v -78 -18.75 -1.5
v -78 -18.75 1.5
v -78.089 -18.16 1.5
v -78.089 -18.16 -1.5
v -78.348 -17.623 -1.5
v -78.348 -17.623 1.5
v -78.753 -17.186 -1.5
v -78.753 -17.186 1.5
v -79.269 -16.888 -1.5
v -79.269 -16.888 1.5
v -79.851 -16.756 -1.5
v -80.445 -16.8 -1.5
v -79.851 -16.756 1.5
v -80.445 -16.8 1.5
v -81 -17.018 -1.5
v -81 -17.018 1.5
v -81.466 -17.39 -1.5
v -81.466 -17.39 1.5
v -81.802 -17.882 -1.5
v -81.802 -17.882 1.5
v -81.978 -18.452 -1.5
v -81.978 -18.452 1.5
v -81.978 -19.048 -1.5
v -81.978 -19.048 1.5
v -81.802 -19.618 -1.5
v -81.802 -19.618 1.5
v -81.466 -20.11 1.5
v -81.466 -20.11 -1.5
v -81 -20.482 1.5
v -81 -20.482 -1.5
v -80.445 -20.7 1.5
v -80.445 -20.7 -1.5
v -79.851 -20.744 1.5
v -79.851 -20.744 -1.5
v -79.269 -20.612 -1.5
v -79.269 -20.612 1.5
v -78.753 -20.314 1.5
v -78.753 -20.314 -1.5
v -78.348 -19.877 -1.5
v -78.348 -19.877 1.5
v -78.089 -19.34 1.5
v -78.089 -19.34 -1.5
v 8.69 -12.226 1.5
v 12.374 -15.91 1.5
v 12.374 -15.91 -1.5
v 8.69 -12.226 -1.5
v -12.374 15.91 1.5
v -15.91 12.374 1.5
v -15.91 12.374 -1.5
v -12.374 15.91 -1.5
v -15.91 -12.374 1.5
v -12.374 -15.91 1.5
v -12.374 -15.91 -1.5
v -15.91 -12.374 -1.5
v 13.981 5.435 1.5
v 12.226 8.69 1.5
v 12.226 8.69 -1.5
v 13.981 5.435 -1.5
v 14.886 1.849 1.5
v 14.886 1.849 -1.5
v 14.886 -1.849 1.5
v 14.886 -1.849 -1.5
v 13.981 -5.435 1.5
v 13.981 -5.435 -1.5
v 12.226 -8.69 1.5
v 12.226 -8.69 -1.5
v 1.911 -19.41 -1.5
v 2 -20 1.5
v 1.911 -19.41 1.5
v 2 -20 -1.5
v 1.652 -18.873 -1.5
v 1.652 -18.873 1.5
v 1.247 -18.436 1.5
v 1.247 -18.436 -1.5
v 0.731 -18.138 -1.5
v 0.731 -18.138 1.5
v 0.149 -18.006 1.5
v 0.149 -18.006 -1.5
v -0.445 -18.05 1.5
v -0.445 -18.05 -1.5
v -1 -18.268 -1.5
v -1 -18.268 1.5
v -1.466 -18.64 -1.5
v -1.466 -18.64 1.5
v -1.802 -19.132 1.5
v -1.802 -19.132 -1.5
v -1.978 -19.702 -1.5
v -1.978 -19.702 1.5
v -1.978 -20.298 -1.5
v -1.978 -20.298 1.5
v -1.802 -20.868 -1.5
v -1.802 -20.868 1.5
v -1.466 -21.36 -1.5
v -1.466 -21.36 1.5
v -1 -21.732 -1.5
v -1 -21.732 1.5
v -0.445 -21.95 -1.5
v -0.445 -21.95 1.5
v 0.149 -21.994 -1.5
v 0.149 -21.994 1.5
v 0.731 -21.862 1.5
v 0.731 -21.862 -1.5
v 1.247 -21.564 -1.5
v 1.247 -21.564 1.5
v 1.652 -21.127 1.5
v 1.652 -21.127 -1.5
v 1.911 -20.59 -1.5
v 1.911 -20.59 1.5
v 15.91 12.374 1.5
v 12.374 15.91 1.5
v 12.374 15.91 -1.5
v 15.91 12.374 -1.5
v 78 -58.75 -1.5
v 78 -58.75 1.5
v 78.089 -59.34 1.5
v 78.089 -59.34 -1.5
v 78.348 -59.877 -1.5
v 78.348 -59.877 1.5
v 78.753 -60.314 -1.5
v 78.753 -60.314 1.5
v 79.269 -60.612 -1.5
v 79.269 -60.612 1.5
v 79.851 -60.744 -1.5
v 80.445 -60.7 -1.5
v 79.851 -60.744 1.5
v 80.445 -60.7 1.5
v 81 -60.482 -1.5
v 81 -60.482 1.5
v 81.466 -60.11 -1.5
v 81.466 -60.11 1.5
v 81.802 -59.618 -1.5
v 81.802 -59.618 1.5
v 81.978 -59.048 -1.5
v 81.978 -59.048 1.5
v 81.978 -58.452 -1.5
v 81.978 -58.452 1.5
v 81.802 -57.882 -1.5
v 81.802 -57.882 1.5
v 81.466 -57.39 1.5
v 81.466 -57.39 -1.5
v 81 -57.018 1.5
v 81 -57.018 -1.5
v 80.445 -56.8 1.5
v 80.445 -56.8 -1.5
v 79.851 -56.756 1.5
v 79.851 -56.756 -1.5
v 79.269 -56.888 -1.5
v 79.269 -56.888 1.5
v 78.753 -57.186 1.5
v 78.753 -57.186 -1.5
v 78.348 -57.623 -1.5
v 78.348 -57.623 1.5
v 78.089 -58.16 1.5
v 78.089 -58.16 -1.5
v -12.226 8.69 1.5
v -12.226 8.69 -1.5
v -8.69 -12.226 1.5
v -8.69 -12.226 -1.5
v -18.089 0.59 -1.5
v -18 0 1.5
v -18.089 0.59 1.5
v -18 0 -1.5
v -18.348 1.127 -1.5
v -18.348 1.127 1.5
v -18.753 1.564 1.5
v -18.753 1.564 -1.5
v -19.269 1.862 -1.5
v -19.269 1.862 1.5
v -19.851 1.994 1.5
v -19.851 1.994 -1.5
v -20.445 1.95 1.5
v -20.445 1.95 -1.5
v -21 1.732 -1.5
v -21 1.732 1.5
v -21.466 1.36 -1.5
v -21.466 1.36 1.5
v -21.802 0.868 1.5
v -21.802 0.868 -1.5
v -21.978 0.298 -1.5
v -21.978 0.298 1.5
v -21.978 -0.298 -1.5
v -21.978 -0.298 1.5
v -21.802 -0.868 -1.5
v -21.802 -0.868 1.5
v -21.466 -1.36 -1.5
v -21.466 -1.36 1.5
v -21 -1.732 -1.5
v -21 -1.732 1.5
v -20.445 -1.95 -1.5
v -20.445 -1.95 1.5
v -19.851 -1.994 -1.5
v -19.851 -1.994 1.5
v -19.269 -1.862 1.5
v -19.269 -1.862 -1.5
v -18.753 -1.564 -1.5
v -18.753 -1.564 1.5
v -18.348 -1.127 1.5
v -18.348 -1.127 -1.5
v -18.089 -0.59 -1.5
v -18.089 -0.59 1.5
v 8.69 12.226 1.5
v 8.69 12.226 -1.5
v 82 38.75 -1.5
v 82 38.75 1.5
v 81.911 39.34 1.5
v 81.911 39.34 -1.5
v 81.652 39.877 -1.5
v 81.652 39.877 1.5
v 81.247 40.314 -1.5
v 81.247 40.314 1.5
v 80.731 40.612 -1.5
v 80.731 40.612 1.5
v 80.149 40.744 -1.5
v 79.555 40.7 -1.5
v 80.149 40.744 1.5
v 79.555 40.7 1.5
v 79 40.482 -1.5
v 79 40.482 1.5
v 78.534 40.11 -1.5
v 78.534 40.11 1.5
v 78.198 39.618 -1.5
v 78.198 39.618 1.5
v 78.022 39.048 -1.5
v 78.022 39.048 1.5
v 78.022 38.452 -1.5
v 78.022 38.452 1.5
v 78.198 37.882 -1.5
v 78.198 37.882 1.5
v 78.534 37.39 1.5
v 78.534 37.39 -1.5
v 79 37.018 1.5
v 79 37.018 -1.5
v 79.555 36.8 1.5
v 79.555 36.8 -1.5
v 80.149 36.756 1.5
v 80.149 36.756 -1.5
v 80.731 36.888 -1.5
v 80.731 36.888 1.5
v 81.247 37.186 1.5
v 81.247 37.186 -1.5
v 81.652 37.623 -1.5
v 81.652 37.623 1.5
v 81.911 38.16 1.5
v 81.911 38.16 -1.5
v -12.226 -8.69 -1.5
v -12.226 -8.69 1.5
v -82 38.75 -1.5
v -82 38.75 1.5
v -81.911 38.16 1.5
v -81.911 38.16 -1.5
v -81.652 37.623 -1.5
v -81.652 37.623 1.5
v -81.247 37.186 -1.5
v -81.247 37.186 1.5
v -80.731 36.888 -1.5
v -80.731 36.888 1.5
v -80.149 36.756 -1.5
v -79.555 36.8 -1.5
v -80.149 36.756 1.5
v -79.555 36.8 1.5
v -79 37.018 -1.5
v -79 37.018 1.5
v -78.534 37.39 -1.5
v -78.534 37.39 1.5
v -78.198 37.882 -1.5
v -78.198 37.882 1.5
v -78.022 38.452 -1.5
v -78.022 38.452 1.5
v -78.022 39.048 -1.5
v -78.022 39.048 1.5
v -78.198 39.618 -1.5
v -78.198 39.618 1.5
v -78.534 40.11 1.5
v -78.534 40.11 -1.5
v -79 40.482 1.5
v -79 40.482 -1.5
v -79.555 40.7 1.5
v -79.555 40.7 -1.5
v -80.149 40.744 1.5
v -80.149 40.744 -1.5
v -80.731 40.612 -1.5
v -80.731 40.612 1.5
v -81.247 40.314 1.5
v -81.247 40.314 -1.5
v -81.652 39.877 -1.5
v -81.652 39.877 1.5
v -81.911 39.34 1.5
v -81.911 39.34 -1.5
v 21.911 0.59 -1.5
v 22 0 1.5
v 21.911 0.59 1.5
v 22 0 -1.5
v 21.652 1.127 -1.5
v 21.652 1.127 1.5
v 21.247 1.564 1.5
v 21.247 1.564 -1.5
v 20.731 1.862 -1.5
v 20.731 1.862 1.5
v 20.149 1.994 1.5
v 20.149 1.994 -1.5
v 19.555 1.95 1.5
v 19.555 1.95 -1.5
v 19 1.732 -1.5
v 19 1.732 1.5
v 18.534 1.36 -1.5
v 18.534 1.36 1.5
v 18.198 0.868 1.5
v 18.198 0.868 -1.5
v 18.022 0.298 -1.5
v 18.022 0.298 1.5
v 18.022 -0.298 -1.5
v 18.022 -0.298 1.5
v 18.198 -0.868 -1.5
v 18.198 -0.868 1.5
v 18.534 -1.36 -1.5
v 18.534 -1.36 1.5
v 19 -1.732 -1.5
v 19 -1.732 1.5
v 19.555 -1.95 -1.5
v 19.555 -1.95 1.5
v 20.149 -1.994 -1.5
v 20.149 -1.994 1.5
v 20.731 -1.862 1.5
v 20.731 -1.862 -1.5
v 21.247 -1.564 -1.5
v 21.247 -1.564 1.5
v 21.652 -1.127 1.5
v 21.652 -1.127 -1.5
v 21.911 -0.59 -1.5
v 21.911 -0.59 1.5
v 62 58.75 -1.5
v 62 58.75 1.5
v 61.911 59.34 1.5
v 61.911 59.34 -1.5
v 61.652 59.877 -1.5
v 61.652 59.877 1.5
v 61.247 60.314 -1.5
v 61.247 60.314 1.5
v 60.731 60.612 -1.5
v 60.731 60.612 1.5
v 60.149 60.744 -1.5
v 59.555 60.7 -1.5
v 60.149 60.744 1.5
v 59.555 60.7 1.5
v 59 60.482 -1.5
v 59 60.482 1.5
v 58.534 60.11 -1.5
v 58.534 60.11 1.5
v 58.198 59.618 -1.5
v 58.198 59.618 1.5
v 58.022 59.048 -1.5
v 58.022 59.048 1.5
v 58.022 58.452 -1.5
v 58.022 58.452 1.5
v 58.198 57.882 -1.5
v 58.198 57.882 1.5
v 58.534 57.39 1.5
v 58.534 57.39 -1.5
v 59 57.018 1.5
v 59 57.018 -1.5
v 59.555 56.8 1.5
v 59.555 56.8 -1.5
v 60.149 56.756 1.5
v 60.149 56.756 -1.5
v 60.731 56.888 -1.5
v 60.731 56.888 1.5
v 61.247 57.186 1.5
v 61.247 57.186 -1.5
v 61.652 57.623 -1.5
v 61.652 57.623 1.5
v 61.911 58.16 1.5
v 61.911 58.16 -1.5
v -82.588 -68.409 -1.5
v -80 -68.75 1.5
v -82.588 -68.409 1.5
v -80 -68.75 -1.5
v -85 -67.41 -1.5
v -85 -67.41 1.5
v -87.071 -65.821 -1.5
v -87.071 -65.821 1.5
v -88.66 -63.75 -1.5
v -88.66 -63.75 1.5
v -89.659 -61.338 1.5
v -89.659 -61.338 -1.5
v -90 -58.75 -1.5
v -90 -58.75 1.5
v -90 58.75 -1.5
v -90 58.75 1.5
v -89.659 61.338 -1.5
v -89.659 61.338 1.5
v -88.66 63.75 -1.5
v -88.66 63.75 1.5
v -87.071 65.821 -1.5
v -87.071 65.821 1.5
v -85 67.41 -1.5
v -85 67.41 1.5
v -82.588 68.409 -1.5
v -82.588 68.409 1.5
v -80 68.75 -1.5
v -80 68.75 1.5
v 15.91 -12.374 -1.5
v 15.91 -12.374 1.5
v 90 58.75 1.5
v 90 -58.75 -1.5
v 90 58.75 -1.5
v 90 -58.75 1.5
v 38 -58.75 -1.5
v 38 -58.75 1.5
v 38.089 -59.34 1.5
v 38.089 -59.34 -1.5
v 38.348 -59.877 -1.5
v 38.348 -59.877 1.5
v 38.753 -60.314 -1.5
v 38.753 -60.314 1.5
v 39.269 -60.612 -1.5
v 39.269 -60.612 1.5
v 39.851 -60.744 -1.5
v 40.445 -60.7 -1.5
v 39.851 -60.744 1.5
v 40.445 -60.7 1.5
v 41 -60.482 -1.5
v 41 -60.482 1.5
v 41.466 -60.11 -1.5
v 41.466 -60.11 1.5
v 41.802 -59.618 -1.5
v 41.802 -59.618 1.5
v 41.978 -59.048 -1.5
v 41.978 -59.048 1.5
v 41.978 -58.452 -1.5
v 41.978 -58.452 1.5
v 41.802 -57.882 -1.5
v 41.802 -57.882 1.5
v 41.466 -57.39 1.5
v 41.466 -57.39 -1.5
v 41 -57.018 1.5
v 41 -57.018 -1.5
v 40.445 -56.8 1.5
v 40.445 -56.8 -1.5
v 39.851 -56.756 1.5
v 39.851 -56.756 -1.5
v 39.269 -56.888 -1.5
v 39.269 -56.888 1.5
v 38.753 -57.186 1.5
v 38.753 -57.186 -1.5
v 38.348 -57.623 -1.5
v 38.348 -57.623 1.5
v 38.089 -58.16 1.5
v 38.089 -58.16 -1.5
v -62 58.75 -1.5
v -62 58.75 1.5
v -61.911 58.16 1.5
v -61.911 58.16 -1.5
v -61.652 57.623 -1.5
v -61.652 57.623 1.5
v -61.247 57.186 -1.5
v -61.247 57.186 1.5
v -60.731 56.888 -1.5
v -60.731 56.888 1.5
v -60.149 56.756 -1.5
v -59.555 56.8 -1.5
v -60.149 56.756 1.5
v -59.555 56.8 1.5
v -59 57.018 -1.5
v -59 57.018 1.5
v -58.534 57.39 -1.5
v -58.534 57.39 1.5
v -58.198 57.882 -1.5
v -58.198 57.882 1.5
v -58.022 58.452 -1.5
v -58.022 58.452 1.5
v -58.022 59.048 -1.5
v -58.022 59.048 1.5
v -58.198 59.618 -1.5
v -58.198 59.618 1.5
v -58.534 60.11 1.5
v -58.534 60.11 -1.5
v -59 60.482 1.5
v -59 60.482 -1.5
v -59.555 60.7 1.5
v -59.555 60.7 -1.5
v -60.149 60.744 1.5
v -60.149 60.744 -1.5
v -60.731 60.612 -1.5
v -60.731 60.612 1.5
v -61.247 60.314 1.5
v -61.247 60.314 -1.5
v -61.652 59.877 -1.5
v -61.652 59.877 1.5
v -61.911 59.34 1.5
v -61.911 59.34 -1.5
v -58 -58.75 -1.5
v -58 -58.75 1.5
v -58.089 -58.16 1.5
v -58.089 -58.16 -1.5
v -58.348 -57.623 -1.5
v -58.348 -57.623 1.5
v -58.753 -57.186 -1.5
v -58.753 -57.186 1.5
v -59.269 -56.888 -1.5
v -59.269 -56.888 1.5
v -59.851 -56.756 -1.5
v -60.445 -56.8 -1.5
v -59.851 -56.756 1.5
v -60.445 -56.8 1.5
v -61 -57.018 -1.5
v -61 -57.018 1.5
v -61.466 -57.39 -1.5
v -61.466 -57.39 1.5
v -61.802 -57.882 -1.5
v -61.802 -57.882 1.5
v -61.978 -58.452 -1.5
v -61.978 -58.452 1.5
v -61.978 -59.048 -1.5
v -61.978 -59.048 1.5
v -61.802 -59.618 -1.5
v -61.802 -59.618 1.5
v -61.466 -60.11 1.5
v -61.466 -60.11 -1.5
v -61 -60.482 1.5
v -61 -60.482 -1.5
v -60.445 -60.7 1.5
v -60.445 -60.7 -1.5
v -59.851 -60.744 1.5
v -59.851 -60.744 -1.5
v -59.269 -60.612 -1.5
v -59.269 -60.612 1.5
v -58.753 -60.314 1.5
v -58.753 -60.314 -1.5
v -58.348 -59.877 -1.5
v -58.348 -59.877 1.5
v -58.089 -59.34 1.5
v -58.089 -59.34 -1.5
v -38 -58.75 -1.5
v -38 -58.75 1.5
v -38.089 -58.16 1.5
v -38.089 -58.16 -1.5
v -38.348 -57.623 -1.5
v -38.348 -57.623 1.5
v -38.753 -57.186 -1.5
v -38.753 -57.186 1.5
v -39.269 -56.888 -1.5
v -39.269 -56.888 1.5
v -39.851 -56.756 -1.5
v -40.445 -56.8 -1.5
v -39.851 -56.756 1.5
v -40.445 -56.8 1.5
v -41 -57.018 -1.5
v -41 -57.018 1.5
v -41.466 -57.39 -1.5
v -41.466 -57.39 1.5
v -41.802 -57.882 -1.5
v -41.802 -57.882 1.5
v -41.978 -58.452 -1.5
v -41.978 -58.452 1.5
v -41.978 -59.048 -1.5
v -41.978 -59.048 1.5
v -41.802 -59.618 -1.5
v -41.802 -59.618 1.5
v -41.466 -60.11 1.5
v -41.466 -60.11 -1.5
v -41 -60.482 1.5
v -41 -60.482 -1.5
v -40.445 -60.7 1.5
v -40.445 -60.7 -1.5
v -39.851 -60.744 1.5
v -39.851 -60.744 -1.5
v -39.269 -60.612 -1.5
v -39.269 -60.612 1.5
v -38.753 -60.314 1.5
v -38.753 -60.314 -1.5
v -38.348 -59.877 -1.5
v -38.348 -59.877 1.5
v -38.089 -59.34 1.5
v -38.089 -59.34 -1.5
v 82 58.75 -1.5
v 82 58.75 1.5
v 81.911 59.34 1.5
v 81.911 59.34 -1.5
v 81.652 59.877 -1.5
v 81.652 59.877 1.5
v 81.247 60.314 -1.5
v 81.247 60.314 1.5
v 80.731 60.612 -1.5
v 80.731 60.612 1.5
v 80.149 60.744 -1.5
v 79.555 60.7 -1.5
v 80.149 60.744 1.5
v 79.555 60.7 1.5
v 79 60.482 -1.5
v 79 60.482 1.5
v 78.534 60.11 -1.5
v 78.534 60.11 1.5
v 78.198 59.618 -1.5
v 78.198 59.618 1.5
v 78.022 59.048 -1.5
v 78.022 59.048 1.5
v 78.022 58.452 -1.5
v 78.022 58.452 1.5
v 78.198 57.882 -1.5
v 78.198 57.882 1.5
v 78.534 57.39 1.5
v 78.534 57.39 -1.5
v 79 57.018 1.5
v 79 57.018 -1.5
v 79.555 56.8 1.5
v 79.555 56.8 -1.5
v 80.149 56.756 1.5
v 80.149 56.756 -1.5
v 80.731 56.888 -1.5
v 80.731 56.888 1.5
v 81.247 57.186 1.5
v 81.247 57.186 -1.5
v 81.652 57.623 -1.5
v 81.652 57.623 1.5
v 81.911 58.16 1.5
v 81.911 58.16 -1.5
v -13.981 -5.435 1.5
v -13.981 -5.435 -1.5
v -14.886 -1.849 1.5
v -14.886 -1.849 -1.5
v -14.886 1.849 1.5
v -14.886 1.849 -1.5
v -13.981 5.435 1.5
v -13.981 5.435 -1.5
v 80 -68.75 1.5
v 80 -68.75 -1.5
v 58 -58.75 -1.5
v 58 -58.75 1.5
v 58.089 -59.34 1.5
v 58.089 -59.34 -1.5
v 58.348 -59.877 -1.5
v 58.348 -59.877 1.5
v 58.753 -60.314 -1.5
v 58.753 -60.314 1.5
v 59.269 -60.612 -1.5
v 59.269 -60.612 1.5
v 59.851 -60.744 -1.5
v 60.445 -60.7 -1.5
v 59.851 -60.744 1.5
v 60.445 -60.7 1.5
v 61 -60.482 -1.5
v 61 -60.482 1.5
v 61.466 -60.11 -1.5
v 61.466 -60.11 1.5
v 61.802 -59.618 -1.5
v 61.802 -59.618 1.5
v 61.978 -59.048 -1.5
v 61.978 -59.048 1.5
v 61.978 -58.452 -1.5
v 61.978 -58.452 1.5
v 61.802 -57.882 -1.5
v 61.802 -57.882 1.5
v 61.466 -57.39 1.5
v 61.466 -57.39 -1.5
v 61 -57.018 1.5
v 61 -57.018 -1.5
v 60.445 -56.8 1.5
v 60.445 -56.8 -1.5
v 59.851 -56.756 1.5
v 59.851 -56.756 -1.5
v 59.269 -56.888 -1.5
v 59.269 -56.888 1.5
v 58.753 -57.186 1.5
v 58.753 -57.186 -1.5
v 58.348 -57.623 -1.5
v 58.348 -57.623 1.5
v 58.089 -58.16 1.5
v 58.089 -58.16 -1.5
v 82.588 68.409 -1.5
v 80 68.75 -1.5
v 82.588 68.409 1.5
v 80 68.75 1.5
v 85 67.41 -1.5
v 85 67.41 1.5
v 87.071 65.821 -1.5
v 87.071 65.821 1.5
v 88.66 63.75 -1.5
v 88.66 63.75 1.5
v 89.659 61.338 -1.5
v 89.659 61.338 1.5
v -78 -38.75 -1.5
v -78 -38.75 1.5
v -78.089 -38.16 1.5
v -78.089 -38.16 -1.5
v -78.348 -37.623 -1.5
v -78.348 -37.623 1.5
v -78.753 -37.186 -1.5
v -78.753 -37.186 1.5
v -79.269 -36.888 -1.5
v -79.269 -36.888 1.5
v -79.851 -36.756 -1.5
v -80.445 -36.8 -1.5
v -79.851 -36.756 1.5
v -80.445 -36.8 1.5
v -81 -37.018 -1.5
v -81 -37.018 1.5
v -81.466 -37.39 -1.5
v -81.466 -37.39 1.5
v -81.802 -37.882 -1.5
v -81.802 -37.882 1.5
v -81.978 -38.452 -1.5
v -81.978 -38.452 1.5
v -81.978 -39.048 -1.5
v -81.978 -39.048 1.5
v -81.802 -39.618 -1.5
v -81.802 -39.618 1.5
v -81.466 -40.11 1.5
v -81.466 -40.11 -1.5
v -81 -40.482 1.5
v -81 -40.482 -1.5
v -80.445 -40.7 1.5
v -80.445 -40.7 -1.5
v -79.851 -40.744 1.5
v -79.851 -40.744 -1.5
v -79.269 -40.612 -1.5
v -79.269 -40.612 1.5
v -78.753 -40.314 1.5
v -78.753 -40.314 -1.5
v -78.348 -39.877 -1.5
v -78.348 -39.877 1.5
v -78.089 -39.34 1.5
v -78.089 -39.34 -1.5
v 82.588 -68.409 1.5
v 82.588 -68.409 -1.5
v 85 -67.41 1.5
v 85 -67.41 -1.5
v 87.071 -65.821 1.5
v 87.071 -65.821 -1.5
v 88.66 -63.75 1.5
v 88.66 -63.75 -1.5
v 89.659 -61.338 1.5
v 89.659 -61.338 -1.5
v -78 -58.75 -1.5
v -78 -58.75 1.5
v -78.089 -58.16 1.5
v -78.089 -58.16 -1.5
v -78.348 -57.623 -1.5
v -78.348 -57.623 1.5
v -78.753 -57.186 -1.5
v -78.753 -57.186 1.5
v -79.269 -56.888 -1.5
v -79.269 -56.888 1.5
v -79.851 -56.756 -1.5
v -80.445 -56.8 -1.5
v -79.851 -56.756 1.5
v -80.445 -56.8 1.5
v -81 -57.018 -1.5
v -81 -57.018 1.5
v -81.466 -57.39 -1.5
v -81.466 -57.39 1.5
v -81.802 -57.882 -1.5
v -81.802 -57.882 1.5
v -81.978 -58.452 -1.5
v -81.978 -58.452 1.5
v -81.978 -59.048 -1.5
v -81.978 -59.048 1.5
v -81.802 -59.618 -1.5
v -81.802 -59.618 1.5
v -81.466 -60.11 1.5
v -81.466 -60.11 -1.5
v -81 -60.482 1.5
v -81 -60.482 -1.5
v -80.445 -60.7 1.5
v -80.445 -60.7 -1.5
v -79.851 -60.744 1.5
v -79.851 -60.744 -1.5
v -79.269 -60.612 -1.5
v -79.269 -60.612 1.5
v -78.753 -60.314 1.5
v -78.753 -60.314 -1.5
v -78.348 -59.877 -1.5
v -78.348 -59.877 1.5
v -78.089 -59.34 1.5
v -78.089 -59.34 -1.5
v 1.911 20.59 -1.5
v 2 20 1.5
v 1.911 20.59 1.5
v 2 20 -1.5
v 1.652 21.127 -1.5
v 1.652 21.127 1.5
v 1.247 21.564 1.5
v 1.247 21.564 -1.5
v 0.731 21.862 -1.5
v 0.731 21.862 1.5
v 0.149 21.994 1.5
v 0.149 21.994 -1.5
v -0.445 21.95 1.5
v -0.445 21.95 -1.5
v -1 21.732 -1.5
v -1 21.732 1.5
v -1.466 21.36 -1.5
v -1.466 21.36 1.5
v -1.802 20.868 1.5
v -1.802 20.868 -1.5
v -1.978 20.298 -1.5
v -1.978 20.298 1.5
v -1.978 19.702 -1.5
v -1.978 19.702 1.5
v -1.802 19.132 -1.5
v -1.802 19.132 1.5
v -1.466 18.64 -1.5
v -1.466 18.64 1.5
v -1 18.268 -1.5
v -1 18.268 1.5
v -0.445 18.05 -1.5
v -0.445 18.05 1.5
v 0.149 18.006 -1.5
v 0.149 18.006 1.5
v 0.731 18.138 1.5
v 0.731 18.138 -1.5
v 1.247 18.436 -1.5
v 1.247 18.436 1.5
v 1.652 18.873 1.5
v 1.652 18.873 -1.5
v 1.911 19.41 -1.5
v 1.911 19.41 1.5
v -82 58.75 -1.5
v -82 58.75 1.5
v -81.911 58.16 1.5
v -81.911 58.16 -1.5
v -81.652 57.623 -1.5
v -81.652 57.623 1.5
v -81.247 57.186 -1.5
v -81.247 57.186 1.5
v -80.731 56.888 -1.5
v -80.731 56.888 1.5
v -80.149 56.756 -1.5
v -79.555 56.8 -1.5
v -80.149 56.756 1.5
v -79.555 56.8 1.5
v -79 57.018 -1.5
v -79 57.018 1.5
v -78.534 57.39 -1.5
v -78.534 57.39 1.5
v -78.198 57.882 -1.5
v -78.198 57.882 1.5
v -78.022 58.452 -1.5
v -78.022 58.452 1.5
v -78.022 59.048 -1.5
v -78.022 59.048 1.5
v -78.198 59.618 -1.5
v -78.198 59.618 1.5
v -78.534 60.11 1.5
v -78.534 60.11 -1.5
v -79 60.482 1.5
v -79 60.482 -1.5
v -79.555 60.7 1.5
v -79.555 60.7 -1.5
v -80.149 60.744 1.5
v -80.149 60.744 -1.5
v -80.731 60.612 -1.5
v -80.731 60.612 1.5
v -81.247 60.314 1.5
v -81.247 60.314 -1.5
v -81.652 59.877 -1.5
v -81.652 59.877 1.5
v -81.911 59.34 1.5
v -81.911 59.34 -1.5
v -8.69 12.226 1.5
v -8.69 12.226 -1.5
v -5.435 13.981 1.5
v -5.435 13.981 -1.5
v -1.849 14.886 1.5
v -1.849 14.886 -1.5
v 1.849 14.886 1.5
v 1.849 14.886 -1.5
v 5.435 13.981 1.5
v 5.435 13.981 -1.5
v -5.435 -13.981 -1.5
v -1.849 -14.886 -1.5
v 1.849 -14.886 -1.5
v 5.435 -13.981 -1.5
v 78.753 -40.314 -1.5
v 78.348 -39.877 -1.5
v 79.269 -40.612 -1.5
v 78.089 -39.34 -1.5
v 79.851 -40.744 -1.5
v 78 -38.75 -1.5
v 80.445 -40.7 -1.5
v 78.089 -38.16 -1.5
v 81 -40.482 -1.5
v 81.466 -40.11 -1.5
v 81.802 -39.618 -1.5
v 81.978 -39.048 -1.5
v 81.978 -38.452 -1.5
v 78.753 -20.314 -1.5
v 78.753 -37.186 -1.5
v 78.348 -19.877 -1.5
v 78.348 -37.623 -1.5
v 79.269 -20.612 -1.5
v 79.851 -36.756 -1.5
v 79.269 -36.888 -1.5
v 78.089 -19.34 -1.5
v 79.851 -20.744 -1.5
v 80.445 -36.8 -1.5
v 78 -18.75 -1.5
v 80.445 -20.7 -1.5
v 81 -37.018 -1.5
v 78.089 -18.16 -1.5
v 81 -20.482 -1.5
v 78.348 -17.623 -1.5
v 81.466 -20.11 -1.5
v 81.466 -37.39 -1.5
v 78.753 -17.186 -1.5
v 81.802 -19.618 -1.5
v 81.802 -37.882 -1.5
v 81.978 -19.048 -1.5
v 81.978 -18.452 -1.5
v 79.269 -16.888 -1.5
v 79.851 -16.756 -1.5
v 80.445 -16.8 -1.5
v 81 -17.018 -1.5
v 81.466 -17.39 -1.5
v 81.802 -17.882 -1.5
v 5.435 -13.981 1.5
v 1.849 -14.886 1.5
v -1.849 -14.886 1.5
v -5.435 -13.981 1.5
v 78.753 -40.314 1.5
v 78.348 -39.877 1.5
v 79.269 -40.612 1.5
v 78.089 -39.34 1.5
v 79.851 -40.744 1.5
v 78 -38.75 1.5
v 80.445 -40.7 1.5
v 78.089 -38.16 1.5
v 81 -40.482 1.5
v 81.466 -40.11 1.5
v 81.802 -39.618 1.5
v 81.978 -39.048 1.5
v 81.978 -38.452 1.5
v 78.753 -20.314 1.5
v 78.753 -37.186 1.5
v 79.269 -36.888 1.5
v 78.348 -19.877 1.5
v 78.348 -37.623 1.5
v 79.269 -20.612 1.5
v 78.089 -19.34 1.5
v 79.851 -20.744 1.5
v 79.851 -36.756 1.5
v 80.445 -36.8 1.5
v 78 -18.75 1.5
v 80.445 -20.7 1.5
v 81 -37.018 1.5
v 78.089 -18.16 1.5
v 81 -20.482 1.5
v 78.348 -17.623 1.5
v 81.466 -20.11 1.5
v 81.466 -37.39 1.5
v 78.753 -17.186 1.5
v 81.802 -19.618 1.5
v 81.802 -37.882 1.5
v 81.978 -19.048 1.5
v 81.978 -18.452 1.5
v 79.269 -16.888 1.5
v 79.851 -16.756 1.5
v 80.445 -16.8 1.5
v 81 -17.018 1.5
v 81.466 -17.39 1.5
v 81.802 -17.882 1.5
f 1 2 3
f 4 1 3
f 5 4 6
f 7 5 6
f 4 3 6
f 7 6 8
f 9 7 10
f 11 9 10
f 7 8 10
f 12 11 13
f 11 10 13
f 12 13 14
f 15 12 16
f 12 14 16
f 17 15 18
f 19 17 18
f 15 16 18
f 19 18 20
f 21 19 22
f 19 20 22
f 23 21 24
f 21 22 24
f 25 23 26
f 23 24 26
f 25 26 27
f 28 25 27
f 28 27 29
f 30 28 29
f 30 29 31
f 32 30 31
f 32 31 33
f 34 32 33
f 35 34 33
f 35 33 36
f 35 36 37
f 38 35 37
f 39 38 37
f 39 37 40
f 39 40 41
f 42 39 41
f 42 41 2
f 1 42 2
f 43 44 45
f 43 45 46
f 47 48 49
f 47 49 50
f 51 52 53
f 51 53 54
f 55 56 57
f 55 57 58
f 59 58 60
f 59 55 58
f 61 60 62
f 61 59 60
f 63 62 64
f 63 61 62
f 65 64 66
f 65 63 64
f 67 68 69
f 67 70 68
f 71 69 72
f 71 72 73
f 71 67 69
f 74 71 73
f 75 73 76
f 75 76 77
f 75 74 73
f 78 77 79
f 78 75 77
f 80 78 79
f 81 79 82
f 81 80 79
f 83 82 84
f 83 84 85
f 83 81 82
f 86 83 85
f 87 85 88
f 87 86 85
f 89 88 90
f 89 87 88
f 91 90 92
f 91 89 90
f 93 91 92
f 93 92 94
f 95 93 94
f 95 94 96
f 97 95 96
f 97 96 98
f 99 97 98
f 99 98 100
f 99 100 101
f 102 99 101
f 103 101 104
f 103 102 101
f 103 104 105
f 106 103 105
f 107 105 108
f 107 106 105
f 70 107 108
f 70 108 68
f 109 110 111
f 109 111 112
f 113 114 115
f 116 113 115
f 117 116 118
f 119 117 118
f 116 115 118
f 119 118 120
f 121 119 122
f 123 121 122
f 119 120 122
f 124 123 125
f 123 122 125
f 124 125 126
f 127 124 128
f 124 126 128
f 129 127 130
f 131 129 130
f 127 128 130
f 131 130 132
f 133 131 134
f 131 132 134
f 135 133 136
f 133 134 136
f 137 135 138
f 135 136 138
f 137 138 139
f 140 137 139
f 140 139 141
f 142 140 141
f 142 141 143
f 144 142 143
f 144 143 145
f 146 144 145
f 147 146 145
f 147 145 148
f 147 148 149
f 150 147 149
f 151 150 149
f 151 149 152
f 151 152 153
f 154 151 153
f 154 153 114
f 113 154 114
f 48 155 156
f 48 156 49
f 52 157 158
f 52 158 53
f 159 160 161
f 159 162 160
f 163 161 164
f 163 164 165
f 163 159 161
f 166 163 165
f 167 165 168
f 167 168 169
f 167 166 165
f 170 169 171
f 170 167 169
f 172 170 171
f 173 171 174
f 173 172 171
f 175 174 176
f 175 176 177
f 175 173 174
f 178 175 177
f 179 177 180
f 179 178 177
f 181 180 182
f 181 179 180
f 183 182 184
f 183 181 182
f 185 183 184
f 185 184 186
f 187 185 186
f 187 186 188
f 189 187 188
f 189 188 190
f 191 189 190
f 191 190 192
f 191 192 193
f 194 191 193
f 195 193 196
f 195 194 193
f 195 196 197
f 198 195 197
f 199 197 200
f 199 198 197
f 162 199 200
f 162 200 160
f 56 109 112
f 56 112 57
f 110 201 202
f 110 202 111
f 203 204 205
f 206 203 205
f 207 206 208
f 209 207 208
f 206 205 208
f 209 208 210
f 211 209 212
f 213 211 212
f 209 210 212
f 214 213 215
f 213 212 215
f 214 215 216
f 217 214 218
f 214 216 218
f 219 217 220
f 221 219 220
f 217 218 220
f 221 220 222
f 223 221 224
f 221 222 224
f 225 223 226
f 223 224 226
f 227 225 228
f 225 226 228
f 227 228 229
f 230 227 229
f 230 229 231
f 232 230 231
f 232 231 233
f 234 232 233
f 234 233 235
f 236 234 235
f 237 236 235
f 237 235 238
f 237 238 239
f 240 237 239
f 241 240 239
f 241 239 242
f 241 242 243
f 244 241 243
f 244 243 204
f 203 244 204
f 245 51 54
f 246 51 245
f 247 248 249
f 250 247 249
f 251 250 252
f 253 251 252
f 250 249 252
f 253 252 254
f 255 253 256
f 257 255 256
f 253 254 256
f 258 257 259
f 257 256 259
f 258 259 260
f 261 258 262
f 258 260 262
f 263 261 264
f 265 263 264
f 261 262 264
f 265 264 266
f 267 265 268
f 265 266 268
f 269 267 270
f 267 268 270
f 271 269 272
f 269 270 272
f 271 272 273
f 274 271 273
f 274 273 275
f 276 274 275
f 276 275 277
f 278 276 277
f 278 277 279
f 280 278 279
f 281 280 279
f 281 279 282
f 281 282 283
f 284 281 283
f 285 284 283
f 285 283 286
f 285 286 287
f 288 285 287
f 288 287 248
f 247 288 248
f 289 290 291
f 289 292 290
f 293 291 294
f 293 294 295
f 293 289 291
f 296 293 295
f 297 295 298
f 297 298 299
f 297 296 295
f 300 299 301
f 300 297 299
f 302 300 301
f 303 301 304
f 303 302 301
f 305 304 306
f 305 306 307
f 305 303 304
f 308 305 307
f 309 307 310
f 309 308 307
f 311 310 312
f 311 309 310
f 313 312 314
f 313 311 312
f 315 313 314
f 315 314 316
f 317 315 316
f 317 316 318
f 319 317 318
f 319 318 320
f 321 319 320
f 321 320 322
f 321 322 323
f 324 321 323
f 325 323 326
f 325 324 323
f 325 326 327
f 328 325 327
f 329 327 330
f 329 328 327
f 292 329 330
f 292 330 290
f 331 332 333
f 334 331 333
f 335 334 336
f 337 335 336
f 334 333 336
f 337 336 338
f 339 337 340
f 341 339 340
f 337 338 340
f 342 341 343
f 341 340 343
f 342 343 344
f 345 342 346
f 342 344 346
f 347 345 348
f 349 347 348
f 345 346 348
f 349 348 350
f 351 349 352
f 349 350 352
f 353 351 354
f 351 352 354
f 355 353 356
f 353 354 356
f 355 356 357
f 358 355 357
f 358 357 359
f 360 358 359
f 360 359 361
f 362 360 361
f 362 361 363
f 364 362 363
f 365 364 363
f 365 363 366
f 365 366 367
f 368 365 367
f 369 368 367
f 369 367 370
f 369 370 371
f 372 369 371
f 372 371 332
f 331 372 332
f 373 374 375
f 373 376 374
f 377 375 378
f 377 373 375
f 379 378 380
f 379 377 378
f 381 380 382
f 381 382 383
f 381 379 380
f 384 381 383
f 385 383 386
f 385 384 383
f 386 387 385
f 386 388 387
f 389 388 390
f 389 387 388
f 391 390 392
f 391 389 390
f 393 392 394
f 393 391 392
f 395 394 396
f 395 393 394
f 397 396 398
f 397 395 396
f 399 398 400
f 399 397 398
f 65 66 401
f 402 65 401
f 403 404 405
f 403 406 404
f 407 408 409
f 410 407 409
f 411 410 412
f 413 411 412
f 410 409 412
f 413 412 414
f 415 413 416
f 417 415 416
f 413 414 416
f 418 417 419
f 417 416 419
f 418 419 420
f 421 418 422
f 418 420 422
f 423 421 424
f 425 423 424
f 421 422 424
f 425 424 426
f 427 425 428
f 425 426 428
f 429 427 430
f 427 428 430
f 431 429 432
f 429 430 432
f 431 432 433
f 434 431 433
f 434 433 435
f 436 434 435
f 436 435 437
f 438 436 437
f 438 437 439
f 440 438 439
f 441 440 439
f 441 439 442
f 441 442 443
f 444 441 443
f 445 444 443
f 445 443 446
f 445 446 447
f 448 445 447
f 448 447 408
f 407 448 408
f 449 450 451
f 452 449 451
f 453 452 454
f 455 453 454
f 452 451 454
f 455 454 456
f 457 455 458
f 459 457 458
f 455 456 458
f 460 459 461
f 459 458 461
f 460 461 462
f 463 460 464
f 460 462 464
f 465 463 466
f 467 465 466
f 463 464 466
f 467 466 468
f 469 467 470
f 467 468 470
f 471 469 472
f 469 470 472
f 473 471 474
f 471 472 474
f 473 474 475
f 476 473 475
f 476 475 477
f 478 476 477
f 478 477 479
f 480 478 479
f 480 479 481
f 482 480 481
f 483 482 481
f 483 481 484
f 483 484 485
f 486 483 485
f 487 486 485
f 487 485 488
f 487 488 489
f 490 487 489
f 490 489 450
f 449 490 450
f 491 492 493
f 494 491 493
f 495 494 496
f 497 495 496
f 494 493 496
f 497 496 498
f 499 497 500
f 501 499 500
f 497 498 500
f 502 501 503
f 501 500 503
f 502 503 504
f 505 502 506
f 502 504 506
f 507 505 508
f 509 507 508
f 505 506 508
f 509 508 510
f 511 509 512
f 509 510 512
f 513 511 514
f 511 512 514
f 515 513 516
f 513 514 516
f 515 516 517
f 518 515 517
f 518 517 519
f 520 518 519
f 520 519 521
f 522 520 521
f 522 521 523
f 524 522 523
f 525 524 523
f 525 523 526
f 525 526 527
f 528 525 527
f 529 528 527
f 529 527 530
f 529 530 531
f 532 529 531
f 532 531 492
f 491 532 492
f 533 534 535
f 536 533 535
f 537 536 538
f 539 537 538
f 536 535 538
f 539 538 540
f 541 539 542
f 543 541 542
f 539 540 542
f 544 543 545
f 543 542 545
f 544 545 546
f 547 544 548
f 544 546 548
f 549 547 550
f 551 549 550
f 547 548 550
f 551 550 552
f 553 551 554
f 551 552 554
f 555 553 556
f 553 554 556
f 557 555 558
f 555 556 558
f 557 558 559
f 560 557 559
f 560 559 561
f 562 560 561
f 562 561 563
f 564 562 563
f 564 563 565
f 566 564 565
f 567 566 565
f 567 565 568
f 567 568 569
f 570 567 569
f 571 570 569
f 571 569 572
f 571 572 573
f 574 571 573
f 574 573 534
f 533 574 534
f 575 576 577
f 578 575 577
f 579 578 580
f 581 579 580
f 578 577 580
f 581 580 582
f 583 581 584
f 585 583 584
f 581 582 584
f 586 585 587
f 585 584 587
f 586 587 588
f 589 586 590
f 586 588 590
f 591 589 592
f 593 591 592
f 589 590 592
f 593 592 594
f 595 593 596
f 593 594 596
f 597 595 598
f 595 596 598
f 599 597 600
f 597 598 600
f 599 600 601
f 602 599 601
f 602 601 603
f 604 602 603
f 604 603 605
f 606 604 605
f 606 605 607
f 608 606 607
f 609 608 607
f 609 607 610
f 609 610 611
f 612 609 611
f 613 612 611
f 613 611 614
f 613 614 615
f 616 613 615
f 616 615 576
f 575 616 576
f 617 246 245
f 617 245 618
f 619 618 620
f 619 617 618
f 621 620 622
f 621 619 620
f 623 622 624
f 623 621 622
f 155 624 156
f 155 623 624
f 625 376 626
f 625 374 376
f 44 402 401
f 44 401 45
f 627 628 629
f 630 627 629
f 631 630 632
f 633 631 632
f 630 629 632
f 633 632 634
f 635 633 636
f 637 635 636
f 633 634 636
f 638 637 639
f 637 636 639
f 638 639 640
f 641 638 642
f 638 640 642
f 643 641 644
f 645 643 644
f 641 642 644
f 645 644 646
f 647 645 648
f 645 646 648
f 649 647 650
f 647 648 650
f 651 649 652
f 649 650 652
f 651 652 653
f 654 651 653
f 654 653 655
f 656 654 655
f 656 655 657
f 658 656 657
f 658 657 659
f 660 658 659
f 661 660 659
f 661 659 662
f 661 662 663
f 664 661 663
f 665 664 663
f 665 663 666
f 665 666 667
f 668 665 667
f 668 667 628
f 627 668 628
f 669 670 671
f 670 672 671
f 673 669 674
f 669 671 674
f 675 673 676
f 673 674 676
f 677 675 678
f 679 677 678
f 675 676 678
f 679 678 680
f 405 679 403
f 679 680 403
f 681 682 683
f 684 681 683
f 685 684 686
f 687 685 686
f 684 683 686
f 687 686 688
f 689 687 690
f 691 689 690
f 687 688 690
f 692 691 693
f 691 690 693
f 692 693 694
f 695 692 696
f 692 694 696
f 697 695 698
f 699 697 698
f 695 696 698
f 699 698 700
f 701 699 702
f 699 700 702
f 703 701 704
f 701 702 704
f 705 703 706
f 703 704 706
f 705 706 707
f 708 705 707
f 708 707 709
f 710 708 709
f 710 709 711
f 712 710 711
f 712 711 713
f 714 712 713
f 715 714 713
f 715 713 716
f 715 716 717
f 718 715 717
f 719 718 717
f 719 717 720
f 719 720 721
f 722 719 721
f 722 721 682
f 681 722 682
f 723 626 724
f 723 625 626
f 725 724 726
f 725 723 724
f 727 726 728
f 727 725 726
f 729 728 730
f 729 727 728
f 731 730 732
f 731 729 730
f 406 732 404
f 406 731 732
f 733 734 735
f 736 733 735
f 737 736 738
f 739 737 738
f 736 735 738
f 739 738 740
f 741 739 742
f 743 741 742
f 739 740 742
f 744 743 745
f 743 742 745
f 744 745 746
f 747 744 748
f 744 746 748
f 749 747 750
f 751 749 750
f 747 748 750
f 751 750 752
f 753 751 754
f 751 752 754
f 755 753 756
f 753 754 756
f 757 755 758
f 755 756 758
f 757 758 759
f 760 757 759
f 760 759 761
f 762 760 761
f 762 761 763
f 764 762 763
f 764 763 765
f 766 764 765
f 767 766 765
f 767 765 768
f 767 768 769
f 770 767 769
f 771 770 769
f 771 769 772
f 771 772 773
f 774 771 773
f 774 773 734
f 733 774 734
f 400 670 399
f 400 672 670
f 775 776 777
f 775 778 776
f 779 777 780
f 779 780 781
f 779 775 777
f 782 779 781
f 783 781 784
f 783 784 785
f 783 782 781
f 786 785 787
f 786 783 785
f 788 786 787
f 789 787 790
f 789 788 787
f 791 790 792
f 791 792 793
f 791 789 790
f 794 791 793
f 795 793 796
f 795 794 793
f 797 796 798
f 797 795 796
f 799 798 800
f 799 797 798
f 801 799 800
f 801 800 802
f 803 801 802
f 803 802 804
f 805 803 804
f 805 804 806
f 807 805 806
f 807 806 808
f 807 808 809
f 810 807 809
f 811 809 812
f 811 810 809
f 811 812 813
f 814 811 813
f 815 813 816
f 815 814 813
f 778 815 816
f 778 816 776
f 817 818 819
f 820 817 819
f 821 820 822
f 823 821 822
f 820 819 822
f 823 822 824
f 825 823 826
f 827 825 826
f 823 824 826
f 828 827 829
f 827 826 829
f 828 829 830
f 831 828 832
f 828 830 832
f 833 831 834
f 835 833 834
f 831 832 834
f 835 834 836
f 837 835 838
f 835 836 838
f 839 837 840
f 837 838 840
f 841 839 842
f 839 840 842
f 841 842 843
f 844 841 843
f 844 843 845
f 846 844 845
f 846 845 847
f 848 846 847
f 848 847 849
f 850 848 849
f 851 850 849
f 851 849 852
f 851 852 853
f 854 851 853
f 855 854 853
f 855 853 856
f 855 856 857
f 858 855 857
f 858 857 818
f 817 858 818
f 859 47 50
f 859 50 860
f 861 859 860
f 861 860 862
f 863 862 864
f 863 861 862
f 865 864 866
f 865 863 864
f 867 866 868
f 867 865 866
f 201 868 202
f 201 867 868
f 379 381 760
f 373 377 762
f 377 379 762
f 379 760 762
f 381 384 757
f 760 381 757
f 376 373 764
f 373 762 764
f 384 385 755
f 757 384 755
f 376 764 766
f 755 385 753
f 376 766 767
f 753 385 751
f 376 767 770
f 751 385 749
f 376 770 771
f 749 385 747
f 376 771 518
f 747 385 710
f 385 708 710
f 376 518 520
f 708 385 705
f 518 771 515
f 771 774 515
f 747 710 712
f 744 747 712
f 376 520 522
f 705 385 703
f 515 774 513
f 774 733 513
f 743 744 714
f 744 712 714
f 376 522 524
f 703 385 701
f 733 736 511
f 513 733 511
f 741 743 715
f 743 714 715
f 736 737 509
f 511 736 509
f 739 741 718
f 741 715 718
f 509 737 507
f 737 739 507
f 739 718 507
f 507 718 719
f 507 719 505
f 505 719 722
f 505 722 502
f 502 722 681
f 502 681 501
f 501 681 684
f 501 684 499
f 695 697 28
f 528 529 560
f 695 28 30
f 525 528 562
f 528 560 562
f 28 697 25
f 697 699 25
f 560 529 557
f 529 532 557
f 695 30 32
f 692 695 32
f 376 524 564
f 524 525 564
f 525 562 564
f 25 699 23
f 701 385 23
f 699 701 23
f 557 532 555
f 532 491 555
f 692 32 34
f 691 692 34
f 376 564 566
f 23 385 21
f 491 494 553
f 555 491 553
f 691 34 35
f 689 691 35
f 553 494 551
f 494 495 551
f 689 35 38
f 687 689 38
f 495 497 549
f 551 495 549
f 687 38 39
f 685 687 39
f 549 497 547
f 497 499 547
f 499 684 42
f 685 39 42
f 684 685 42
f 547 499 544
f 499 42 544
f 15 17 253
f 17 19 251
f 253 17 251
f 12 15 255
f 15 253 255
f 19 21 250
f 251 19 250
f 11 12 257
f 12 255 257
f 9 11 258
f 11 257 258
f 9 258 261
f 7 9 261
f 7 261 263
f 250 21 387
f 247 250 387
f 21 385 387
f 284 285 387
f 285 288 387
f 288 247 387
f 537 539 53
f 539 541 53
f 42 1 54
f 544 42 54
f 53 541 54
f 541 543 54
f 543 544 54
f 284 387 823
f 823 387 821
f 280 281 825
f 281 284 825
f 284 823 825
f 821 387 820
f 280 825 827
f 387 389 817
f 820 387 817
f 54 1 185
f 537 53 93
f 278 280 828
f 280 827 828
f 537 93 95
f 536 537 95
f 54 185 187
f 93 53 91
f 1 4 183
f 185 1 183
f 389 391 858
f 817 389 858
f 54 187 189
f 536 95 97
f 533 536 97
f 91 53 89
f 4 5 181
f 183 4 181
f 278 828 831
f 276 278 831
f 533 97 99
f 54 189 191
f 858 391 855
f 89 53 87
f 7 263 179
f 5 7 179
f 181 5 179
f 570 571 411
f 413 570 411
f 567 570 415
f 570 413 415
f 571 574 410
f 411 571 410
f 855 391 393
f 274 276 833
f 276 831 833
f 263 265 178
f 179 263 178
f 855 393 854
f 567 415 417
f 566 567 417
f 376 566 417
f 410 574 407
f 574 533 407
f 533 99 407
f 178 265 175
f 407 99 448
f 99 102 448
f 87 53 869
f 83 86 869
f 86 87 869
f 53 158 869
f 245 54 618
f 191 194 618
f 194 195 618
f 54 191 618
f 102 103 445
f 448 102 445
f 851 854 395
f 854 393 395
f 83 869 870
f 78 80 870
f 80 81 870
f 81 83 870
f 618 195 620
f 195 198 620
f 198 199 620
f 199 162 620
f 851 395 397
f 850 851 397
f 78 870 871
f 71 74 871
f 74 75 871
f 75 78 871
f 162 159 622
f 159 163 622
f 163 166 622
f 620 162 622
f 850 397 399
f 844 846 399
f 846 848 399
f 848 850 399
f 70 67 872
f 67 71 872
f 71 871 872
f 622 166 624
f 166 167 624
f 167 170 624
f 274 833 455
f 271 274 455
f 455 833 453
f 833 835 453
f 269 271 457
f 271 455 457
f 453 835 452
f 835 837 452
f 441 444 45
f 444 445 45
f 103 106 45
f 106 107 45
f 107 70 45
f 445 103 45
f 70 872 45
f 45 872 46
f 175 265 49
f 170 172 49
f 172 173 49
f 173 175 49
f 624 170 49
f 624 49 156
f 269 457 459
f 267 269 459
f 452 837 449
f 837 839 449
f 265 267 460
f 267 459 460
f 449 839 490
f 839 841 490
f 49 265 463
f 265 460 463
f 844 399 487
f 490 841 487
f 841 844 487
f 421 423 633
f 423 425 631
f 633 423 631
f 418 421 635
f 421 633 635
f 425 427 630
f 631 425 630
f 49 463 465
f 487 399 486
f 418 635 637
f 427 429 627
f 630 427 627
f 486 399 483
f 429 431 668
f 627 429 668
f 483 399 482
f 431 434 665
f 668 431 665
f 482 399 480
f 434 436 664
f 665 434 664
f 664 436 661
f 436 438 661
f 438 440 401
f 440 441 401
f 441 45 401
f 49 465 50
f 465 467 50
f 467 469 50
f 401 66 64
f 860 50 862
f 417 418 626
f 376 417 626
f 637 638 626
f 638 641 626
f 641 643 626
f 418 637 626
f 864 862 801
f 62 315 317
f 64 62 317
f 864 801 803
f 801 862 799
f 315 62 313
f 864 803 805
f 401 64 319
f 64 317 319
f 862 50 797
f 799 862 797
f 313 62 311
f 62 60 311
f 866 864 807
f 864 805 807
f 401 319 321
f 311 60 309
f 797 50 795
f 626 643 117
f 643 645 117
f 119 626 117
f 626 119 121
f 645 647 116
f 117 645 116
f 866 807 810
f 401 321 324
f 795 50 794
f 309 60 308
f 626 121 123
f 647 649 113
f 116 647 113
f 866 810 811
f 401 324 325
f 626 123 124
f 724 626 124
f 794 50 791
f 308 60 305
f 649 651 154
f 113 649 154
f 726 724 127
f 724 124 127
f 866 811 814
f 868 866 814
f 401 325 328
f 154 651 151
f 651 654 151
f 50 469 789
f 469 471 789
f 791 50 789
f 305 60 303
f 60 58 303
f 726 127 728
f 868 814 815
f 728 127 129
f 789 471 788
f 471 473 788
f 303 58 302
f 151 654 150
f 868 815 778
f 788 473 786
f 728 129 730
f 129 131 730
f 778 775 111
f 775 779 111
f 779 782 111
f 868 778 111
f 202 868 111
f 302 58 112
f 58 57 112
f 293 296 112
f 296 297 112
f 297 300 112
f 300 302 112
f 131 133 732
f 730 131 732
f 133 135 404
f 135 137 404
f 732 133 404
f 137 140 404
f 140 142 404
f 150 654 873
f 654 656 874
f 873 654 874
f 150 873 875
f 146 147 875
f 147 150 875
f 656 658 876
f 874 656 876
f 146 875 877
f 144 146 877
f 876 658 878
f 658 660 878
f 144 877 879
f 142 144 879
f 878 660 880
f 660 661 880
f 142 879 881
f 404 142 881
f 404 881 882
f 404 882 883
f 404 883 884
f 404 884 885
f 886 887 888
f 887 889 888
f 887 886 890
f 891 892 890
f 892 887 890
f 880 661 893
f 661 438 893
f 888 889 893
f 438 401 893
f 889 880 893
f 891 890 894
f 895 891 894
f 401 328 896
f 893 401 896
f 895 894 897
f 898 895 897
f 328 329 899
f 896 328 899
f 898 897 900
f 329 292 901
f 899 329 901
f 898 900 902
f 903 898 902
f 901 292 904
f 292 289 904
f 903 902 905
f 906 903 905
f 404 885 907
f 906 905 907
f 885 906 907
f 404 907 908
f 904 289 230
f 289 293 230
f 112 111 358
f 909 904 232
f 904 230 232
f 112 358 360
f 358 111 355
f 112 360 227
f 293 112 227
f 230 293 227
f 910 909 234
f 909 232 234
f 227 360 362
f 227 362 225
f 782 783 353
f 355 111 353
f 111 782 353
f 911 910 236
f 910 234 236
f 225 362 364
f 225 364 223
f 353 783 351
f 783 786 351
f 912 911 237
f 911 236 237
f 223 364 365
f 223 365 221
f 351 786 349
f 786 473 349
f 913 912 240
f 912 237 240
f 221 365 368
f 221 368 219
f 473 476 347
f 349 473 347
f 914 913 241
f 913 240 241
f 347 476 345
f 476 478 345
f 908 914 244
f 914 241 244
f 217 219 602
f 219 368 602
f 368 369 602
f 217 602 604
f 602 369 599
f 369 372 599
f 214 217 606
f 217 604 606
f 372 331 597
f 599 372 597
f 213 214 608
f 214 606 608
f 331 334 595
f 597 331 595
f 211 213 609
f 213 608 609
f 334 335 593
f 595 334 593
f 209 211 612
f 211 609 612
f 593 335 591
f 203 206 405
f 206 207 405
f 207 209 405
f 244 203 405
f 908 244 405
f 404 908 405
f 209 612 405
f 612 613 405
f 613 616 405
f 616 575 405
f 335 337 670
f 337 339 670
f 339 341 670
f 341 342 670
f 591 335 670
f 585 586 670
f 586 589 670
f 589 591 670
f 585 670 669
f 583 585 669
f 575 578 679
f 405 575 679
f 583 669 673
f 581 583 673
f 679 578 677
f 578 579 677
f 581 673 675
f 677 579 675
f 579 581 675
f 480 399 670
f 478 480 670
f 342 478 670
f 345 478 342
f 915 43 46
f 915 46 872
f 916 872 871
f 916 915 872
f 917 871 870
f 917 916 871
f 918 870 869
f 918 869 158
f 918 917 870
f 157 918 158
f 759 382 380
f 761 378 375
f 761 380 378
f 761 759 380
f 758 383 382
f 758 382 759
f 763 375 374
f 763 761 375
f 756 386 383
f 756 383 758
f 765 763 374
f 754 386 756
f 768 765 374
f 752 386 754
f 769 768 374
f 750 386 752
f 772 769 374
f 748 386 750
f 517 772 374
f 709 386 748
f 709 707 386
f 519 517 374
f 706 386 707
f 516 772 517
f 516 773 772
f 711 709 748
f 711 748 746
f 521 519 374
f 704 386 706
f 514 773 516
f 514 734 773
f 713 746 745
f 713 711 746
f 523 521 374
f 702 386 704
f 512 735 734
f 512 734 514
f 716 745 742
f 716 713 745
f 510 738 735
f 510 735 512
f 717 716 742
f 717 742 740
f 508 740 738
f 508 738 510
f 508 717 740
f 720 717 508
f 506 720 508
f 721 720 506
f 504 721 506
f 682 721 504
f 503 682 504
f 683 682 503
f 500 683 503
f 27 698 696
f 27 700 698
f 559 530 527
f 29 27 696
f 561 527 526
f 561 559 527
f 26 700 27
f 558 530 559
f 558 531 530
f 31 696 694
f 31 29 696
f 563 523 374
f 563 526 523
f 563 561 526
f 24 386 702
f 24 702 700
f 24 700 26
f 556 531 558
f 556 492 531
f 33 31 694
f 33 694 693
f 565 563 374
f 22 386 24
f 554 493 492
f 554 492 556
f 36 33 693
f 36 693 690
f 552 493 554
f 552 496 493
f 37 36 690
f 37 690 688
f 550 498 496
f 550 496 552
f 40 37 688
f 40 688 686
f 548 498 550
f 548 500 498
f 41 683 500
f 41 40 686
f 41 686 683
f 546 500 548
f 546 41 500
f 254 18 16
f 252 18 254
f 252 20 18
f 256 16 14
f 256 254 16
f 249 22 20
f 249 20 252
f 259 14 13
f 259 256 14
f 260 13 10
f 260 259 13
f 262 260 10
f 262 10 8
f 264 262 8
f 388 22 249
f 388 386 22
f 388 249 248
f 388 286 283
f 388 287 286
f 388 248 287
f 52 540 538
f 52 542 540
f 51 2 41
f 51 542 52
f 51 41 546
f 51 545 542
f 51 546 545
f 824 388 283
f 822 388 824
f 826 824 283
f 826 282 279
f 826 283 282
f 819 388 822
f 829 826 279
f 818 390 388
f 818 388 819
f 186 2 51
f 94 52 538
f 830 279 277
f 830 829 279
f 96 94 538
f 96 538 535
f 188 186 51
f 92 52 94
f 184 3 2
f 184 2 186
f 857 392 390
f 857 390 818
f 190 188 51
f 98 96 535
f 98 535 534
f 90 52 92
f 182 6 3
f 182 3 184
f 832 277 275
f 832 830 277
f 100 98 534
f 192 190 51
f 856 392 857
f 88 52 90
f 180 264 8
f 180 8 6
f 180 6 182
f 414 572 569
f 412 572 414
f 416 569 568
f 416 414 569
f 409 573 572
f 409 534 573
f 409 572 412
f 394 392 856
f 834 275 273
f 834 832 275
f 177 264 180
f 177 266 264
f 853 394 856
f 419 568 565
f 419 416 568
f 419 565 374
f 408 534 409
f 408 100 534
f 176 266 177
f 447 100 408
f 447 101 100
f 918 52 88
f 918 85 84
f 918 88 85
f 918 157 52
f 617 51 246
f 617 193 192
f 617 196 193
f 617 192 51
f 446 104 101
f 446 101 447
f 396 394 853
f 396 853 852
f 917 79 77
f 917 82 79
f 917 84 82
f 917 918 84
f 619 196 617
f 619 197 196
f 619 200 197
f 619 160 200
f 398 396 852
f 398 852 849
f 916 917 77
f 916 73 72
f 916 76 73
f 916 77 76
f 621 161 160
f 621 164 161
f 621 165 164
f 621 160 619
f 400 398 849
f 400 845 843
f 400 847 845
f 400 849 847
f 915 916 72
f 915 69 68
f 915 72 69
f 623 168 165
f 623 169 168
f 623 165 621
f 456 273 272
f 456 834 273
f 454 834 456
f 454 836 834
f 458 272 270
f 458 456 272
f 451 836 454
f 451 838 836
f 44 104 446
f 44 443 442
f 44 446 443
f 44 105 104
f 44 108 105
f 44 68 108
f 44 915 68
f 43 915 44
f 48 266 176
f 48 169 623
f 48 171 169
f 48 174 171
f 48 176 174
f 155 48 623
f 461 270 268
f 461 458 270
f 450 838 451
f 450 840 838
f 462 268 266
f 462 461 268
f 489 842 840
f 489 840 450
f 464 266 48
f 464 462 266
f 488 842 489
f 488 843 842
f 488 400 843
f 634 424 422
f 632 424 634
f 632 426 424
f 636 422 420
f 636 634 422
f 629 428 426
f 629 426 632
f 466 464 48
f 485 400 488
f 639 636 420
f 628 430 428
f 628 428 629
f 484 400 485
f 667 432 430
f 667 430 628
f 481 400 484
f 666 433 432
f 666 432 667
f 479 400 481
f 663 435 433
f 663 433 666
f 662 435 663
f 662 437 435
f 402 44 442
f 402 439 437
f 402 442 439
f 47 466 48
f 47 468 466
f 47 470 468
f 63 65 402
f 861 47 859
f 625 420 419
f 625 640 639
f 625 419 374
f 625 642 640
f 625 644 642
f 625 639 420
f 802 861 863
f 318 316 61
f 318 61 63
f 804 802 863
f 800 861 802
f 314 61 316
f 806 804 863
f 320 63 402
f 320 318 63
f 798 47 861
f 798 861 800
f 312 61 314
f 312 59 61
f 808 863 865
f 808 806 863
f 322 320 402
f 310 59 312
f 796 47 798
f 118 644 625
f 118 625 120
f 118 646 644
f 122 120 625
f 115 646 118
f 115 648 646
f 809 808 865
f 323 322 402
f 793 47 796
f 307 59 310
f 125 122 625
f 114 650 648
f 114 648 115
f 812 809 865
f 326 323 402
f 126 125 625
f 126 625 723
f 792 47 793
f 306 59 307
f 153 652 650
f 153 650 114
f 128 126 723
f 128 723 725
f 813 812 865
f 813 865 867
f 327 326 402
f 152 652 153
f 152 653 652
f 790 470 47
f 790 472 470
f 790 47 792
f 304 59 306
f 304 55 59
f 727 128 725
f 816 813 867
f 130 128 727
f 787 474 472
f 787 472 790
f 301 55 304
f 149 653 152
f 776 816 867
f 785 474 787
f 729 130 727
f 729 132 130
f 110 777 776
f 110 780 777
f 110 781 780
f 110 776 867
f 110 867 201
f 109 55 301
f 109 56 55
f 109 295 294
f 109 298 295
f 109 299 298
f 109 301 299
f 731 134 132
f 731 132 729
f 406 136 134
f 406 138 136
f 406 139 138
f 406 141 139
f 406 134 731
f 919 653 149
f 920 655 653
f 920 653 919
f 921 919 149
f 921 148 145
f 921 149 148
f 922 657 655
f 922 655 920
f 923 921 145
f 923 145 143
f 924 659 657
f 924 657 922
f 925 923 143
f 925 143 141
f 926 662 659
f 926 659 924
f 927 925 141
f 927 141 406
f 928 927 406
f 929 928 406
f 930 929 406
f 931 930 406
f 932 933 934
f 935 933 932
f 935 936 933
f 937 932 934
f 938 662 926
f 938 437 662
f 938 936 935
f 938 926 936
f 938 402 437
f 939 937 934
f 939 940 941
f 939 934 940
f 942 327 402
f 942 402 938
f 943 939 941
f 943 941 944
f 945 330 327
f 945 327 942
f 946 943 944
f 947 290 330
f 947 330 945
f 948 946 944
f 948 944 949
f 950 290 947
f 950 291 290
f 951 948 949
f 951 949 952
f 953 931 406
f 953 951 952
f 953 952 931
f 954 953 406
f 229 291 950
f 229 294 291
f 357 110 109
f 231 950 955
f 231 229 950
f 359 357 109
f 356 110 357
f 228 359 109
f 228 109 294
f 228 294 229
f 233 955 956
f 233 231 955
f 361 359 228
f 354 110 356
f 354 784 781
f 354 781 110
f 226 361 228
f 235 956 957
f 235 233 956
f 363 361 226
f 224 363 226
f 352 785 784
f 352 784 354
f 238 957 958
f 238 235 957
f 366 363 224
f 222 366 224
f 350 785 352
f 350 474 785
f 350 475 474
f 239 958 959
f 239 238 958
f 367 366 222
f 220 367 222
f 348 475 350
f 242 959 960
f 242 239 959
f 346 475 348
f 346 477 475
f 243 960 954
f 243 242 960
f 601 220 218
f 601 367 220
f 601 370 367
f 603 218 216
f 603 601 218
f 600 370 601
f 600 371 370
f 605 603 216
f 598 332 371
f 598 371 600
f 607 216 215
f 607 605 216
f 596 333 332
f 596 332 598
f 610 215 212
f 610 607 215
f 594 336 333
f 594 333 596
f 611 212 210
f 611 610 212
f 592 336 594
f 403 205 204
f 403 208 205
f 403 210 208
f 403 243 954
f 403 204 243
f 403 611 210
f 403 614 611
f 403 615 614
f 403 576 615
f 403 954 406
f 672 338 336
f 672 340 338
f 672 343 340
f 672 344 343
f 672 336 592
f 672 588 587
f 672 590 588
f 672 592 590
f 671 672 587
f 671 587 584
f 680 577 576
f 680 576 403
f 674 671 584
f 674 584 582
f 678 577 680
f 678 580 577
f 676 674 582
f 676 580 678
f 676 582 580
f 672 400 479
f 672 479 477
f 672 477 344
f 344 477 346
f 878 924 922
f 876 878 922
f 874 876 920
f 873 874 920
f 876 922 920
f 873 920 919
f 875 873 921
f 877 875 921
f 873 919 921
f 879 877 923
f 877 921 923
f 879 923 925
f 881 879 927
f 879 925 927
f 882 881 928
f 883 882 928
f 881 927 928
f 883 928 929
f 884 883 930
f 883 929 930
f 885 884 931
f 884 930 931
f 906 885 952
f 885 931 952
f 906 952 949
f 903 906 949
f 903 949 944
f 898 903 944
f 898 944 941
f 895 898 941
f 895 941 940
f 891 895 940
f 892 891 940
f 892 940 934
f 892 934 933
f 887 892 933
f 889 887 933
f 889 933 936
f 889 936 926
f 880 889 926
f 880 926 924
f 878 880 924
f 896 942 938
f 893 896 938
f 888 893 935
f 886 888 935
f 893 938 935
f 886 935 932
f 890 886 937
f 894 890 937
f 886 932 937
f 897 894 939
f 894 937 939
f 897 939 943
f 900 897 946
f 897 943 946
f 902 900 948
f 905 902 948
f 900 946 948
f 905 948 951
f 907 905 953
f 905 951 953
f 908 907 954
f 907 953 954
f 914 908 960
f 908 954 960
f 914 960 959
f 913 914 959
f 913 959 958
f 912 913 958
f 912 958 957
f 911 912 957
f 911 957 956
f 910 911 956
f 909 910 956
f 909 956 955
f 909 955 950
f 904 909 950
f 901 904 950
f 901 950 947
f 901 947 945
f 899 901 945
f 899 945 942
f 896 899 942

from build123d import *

# Parameters (mm, degrees)
SKETCH_1_R          = 2.0000000000000013
SKETCH_1_R_2        = 2.000000000000003
SKETCH_1_R_3        = 1.9999999999999987
EXTRUDE_1_DEPTH     = 1.5
FILLET_1_R          = 10
SKETCH_3_R          = 1.9999999999999967
SKETCH_3_R_2        = 2.0000000000000036
CUT_EXTRUDE_4_DEPTH = 114.29414150784675


with BuildPart() as part:
    # 草图1 → 凸台-拉伸1 (new, symmetric)
    with BuildSketch(Plane.XY):
        Polygon((-90, -68.75000000000003), (90, -68.75), (90, 68.75), (-90, 68.74999999999997), align=None)
        with Locations((-1.22e-15, -20)):
            Circle(SKETCH_1_R, mode=Mode.SUBTRACT)
        with Locations((-20, 0)):
            Circle(SKETCH_1_R_2, mode=Mode.SUBTRACT)
        with BuildLine():
            Line((-15.909902576697288, 12.374368670764625), (-12.374368670764548, 15.909902576697364))
            Line((-12.374368670764548, 15.909902576697364), (-8.690483378709542, 12.226017284642358))
            ThreePointArc((-8.690483378709553, 12.226017284642344), (5.421e-14, 15.000000000000014), (8.690483378709638, 12.226017284642284))
            Line((8.69048337870963, 12.226017284642296), (12.374368670764623, 15.909902576697288))
            Line((12.374368670764623, 15.909902576697288), (15.909902576697364, 12.37436867076455))
            Line((15.909902576697364, 12.37436867076455), (12.226017284642353, 8.690483378709539))
            ThreePointArc((12.226017284642342, 8.690483378709551), (14.289686127932187, 4.561235618248917), (15, 1.388e-14))
            ThreePointArc((15, 1.02e-14), (14.289686127932162, -4.561235618248962), (12.226017284642253, -8.690483378709645))
            Line((12.226017284642284, -8.690483378709619), (15.909902576697288, -12.374368670764623))
            Line((15.909902576697288, -12.374368670764623), (12.37436867076455, -15.909902576697364))
            Line((12.37436867076455, -15.909902576697364), (8.690483378709526, -12.22601728464234))
            ThreePointArc((8.690483378709535, -12.226017284642328), (-5.605e-14, -14.999999999999986), (-8.690483378709638, -12.226017284642255))
            Line((-8.690483378709613, -12.226017284642284), (-12.374368670764621, -15.909902576697291))
            Line((-12.374368670764621, -15.909902576697291), (-15.90990257669736, -12.374368670764552))
            Line((-15.90990257669736, -12.374368670764552), (-12.22601728464234, -8.69048337870953))
            ThreePointArc((-12.226017284642326, -8.690483378709544), (-15, 5.568e-14), (-12.226017284642273, 8.690483378709645))
            Line((-12.226017284642293, 8.69048337870963), (-15.909902576697288, 12.374368670764625))
        make_face(mode=Mode.SUBTRACT)
        with Locations((20, 2.45e-15)):
            Circle(SKETCH_1_R_2, mode=Mode.SUBTRACT)
        with Locations((-1.22e-15, 20)):
            Circle(SKETCH_1_R_3, mode=Mode.SUBTRACT)
    extrude(amount=EXTRUDE_1_DEPTH, both=True)

    # 圆角1
    fillet_1_edges = [part.edges().sort_by_distance(p)[0] for p in [
        (-90, 68.74999999999997, 0),
        (90, 68.75, 0),
        (90, -68.75, 0),
        (-90, -68.75000000000003, 0),
    ]]
    fillet(fillet_1_edges, radius=FILLET_1_R)

    # 草图3 → 切除-拉伸4 (cut, through all)
    with BuildSketch(Plane.XY.offset(1.5)):
        with Locations((-80, -58.75000000000001)):
            Circle(SKETCH_3_R)
        with Locations((-60, -58.75000000000001)):
            Circle(SKETCH_3_R)
        with Locations((-80.00000000000001, -38.75000000000001)):
            Circle(SKETCH_3_R)
        with Locations((-39.99999999999999, -58.75000000000001)):
            Circle(SKETCH_3_R_2)
        with Locations((-80.00000000000001, -18.750000000000007)):
            Circle(SKETCH_3_R)
        with Locations(Location((80.00000000000004, -38.749999999999986, 0), (0, 0, 180))):
            Circle(SKETCH_3_R)
        with Locations(Location((60.00000000000004, -58.75, 0), (0, 0, 180))):
            Circle(SKETCH_3_R)
        with Locations(Location((80.00000000000003, -58.749999999999986, 0), (0, 0, 180))):
            Circle(SKETCH_3_R)
        with Locations((80.00000000000003, 58.749999999999986)):
            Circle(SKETCH_3_R)
        with Locations((60.00000000000004, 58.75)):
            Circle(SKETCH_3_R)
        with Locations((80.00000000000004, 38.749999999999986)):
            Circle(SKETCH_3_R)
        with Locations(Location((-80.00000000000001, 38.75000000000001, 0), (0, 0, 180))):
            Circle(SKETCH_3_R)
        with Locations(Location((-60, 58.75000000000001, 0), (0, 0, 180))):
            Circle(SKETCH_3_R)
        with Locations(Location((-80, 58.75000000000001, 0), (0, 0, 180))):
            Circle(SKETCH_3_R)
        with Locations(Location((39.99999999999999, -58.75000000000001, 0), (0, 0, 180))):
            Circle(SKETCH_3_R_2)
        with Locations(Location((80.00000000000001, -18.750000000000007, 0), (0, 0, 180))):
            Circle(SKETCH_3_R)
    extrude(amount=-CUT_EXTRUDE_4_DEPTH, mode=Mode.SUBTRACT)


solid = part.part
